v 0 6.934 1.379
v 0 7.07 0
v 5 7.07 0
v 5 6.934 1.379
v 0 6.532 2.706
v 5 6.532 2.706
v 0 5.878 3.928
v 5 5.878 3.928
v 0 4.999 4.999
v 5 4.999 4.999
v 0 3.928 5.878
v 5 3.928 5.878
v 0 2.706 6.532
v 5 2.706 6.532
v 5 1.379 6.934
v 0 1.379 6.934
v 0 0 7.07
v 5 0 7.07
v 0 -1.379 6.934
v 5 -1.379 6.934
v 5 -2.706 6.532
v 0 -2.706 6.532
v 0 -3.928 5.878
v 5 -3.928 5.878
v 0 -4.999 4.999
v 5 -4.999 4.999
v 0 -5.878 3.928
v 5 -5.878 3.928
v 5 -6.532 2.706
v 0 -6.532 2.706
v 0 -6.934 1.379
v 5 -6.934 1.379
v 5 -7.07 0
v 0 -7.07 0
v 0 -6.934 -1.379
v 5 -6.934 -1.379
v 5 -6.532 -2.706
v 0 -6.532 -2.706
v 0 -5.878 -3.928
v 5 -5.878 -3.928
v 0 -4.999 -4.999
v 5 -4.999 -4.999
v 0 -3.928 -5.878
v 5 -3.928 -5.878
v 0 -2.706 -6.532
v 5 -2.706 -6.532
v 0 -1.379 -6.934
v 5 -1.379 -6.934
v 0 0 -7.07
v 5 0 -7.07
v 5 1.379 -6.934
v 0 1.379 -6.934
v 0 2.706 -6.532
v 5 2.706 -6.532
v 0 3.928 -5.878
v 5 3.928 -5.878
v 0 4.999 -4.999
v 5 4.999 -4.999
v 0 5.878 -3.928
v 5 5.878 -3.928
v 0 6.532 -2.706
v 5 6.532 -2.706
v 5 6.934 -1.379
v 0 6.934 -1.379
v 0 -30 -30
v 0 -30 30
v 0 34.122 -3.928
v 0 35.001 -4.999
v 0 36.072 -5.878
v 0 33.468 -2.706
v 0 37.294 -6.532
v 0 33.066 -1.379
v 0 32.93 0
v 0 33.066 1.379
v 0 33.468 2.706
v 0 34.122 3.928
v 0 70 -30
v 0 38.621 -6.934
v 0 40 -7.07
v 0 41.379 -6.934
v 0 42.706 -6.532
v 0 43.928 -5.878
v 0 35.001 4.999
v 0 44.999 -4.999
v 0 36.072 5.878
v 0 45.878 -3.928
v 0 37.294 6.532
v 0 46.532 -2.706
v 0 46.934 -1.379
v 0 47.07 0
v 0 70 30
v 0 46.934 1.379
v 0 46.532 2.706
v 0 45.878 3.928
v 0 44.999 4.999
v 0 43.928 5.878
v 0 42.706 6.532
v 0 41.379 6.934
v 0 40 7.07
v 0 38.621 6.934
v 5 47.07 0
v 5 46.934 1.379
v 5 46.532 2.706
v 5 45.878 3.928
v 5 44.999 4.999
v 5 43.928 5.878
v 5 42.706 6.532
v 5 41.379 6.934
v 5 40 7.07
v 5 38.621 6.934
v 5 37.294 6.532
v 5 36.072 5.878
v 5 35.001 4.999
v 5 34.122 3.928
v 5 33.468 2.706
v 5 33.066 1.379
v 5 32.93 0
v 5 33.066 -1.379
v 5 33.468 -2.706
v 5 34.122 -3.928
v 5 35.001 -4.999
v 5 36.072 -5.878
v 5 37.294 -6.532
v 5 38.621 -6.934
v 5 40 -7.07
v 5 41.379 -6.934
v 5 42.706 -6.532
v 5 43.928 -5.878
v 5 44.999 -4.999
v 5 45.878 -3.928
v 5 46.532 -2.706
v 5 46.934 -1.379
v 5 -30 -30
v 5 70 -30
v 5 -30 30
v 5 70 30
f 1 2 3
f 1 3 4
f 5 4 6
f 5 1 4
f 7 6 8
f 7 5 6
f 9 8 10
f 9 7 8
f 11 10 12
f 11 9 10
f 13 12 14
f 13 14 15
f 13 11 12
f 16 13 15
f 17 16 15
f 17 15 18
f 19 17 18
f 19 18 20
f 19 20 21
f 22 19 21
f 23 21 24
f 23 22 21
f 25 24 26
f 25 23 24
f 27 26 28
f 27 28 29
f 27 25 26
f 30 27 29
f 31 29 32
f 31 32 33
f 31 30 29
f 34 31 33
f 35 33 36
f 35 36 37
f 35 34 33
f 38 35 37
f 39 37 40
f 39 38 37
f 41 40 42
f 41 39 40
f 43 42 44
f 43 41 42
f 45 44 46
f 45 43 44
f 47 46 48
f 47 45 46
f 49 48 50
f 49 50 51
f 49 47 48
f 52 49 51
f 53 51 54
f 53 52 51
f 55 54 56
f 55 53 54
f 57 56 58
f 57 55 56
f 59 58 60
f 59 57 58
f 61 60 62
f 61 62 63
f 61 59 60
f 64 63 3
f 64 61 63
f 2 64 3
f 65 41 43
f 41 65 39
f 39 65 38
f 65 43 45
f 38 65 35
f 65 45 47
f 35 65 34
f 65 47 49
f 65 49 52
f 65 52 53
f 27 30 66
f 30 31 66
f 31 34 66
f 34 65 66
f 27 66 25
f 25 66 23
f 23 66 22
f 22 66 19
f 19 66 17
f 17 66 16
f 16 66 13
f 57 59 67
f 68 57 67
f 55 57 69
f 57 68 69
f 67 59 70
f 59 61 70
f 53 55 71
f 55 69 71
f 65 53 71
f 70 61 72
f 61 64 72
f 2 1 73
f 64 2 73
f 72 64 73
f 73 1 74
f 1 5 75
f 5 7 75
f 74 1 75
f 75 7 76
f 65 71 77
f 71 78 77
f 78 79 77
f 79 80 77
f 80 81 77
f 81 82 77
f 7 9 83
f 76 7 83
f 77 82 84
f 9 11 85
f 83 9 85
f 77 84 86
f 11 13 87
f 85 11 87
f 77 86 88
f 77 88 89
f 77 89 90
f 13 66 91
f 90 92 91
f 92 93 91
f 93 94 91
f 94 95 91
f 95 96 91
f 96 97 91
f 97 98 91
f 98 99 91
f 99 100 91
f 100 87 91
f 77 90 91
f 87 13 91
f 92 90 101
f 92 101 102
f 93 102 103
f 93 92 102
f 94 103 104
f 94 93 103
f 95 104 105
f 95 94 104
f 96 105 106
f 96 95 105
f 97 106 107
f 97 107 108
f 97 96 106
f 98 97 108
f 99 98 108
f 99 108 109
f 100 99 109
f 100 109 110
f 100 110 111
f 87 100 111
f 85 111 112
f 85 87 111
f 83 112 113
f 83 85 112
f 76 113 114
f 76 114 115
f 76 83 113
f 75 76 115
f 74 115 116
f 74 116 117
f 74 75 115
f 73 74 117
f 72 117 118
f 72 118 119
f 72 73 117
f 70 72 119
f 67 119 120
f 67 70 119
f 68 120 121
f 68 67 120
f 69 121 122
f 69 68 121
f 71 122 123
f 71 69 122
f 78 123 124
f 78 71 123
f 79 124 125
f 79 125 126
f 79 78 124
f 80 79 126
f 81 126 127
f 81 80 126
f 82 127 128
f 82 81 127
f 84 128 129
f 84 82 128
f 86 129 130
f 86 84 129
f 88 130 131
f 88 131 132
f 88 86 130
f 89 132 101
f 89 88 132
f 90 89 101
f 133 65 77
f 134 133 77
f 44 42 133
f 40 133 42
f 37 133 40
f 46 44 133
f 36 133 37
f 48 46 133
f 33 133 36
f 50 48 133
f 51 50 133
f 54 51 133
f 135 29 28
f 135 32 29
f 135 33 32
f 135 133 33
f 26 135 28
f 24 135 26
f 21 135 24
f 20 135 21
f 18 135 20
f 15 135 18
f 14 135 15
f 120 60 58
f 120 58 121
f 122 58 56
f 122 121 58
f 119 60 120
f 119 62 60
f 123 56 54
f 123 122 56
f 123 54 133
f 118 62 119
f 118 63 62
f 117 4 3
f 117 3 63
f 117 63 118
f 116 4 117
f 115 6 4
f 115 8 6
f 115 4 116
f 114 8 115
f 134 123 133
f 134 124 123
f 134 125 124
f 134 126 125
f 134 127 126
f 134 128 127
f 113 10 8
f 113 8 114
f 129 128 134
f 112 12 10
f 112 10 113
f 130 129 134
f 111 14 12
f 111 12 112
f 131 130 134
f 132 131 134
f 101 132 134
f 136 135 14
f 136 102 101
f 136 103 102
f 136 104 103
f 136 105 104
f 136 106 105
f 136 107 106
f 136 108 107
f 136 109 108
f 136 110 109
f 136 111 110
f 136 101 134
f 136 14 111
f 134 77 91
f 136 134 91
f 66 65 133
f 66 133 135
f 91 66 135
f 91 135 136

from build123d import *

# Parameters (mm, degrees)
F0_W     = 100
F0_H     = 60
F0_R     = 7.07
F1_DEPTH = 5


with BuildPart() as f1:
    # F0 (on Right) → F1 (new body)
    with BuildSketch(Plane.YZ):
        with Locations((20, 0)):
            Rectangle(F0_W, F0_H)
        Circle(F0_R, mode=Mode.SUBTRACT)
        with Locations((40, 0)):
            Circle(F0_R, mode=Mode.SUBTRACT)
    extrude(amount=F1_DEPTH)


solid = f1.part
